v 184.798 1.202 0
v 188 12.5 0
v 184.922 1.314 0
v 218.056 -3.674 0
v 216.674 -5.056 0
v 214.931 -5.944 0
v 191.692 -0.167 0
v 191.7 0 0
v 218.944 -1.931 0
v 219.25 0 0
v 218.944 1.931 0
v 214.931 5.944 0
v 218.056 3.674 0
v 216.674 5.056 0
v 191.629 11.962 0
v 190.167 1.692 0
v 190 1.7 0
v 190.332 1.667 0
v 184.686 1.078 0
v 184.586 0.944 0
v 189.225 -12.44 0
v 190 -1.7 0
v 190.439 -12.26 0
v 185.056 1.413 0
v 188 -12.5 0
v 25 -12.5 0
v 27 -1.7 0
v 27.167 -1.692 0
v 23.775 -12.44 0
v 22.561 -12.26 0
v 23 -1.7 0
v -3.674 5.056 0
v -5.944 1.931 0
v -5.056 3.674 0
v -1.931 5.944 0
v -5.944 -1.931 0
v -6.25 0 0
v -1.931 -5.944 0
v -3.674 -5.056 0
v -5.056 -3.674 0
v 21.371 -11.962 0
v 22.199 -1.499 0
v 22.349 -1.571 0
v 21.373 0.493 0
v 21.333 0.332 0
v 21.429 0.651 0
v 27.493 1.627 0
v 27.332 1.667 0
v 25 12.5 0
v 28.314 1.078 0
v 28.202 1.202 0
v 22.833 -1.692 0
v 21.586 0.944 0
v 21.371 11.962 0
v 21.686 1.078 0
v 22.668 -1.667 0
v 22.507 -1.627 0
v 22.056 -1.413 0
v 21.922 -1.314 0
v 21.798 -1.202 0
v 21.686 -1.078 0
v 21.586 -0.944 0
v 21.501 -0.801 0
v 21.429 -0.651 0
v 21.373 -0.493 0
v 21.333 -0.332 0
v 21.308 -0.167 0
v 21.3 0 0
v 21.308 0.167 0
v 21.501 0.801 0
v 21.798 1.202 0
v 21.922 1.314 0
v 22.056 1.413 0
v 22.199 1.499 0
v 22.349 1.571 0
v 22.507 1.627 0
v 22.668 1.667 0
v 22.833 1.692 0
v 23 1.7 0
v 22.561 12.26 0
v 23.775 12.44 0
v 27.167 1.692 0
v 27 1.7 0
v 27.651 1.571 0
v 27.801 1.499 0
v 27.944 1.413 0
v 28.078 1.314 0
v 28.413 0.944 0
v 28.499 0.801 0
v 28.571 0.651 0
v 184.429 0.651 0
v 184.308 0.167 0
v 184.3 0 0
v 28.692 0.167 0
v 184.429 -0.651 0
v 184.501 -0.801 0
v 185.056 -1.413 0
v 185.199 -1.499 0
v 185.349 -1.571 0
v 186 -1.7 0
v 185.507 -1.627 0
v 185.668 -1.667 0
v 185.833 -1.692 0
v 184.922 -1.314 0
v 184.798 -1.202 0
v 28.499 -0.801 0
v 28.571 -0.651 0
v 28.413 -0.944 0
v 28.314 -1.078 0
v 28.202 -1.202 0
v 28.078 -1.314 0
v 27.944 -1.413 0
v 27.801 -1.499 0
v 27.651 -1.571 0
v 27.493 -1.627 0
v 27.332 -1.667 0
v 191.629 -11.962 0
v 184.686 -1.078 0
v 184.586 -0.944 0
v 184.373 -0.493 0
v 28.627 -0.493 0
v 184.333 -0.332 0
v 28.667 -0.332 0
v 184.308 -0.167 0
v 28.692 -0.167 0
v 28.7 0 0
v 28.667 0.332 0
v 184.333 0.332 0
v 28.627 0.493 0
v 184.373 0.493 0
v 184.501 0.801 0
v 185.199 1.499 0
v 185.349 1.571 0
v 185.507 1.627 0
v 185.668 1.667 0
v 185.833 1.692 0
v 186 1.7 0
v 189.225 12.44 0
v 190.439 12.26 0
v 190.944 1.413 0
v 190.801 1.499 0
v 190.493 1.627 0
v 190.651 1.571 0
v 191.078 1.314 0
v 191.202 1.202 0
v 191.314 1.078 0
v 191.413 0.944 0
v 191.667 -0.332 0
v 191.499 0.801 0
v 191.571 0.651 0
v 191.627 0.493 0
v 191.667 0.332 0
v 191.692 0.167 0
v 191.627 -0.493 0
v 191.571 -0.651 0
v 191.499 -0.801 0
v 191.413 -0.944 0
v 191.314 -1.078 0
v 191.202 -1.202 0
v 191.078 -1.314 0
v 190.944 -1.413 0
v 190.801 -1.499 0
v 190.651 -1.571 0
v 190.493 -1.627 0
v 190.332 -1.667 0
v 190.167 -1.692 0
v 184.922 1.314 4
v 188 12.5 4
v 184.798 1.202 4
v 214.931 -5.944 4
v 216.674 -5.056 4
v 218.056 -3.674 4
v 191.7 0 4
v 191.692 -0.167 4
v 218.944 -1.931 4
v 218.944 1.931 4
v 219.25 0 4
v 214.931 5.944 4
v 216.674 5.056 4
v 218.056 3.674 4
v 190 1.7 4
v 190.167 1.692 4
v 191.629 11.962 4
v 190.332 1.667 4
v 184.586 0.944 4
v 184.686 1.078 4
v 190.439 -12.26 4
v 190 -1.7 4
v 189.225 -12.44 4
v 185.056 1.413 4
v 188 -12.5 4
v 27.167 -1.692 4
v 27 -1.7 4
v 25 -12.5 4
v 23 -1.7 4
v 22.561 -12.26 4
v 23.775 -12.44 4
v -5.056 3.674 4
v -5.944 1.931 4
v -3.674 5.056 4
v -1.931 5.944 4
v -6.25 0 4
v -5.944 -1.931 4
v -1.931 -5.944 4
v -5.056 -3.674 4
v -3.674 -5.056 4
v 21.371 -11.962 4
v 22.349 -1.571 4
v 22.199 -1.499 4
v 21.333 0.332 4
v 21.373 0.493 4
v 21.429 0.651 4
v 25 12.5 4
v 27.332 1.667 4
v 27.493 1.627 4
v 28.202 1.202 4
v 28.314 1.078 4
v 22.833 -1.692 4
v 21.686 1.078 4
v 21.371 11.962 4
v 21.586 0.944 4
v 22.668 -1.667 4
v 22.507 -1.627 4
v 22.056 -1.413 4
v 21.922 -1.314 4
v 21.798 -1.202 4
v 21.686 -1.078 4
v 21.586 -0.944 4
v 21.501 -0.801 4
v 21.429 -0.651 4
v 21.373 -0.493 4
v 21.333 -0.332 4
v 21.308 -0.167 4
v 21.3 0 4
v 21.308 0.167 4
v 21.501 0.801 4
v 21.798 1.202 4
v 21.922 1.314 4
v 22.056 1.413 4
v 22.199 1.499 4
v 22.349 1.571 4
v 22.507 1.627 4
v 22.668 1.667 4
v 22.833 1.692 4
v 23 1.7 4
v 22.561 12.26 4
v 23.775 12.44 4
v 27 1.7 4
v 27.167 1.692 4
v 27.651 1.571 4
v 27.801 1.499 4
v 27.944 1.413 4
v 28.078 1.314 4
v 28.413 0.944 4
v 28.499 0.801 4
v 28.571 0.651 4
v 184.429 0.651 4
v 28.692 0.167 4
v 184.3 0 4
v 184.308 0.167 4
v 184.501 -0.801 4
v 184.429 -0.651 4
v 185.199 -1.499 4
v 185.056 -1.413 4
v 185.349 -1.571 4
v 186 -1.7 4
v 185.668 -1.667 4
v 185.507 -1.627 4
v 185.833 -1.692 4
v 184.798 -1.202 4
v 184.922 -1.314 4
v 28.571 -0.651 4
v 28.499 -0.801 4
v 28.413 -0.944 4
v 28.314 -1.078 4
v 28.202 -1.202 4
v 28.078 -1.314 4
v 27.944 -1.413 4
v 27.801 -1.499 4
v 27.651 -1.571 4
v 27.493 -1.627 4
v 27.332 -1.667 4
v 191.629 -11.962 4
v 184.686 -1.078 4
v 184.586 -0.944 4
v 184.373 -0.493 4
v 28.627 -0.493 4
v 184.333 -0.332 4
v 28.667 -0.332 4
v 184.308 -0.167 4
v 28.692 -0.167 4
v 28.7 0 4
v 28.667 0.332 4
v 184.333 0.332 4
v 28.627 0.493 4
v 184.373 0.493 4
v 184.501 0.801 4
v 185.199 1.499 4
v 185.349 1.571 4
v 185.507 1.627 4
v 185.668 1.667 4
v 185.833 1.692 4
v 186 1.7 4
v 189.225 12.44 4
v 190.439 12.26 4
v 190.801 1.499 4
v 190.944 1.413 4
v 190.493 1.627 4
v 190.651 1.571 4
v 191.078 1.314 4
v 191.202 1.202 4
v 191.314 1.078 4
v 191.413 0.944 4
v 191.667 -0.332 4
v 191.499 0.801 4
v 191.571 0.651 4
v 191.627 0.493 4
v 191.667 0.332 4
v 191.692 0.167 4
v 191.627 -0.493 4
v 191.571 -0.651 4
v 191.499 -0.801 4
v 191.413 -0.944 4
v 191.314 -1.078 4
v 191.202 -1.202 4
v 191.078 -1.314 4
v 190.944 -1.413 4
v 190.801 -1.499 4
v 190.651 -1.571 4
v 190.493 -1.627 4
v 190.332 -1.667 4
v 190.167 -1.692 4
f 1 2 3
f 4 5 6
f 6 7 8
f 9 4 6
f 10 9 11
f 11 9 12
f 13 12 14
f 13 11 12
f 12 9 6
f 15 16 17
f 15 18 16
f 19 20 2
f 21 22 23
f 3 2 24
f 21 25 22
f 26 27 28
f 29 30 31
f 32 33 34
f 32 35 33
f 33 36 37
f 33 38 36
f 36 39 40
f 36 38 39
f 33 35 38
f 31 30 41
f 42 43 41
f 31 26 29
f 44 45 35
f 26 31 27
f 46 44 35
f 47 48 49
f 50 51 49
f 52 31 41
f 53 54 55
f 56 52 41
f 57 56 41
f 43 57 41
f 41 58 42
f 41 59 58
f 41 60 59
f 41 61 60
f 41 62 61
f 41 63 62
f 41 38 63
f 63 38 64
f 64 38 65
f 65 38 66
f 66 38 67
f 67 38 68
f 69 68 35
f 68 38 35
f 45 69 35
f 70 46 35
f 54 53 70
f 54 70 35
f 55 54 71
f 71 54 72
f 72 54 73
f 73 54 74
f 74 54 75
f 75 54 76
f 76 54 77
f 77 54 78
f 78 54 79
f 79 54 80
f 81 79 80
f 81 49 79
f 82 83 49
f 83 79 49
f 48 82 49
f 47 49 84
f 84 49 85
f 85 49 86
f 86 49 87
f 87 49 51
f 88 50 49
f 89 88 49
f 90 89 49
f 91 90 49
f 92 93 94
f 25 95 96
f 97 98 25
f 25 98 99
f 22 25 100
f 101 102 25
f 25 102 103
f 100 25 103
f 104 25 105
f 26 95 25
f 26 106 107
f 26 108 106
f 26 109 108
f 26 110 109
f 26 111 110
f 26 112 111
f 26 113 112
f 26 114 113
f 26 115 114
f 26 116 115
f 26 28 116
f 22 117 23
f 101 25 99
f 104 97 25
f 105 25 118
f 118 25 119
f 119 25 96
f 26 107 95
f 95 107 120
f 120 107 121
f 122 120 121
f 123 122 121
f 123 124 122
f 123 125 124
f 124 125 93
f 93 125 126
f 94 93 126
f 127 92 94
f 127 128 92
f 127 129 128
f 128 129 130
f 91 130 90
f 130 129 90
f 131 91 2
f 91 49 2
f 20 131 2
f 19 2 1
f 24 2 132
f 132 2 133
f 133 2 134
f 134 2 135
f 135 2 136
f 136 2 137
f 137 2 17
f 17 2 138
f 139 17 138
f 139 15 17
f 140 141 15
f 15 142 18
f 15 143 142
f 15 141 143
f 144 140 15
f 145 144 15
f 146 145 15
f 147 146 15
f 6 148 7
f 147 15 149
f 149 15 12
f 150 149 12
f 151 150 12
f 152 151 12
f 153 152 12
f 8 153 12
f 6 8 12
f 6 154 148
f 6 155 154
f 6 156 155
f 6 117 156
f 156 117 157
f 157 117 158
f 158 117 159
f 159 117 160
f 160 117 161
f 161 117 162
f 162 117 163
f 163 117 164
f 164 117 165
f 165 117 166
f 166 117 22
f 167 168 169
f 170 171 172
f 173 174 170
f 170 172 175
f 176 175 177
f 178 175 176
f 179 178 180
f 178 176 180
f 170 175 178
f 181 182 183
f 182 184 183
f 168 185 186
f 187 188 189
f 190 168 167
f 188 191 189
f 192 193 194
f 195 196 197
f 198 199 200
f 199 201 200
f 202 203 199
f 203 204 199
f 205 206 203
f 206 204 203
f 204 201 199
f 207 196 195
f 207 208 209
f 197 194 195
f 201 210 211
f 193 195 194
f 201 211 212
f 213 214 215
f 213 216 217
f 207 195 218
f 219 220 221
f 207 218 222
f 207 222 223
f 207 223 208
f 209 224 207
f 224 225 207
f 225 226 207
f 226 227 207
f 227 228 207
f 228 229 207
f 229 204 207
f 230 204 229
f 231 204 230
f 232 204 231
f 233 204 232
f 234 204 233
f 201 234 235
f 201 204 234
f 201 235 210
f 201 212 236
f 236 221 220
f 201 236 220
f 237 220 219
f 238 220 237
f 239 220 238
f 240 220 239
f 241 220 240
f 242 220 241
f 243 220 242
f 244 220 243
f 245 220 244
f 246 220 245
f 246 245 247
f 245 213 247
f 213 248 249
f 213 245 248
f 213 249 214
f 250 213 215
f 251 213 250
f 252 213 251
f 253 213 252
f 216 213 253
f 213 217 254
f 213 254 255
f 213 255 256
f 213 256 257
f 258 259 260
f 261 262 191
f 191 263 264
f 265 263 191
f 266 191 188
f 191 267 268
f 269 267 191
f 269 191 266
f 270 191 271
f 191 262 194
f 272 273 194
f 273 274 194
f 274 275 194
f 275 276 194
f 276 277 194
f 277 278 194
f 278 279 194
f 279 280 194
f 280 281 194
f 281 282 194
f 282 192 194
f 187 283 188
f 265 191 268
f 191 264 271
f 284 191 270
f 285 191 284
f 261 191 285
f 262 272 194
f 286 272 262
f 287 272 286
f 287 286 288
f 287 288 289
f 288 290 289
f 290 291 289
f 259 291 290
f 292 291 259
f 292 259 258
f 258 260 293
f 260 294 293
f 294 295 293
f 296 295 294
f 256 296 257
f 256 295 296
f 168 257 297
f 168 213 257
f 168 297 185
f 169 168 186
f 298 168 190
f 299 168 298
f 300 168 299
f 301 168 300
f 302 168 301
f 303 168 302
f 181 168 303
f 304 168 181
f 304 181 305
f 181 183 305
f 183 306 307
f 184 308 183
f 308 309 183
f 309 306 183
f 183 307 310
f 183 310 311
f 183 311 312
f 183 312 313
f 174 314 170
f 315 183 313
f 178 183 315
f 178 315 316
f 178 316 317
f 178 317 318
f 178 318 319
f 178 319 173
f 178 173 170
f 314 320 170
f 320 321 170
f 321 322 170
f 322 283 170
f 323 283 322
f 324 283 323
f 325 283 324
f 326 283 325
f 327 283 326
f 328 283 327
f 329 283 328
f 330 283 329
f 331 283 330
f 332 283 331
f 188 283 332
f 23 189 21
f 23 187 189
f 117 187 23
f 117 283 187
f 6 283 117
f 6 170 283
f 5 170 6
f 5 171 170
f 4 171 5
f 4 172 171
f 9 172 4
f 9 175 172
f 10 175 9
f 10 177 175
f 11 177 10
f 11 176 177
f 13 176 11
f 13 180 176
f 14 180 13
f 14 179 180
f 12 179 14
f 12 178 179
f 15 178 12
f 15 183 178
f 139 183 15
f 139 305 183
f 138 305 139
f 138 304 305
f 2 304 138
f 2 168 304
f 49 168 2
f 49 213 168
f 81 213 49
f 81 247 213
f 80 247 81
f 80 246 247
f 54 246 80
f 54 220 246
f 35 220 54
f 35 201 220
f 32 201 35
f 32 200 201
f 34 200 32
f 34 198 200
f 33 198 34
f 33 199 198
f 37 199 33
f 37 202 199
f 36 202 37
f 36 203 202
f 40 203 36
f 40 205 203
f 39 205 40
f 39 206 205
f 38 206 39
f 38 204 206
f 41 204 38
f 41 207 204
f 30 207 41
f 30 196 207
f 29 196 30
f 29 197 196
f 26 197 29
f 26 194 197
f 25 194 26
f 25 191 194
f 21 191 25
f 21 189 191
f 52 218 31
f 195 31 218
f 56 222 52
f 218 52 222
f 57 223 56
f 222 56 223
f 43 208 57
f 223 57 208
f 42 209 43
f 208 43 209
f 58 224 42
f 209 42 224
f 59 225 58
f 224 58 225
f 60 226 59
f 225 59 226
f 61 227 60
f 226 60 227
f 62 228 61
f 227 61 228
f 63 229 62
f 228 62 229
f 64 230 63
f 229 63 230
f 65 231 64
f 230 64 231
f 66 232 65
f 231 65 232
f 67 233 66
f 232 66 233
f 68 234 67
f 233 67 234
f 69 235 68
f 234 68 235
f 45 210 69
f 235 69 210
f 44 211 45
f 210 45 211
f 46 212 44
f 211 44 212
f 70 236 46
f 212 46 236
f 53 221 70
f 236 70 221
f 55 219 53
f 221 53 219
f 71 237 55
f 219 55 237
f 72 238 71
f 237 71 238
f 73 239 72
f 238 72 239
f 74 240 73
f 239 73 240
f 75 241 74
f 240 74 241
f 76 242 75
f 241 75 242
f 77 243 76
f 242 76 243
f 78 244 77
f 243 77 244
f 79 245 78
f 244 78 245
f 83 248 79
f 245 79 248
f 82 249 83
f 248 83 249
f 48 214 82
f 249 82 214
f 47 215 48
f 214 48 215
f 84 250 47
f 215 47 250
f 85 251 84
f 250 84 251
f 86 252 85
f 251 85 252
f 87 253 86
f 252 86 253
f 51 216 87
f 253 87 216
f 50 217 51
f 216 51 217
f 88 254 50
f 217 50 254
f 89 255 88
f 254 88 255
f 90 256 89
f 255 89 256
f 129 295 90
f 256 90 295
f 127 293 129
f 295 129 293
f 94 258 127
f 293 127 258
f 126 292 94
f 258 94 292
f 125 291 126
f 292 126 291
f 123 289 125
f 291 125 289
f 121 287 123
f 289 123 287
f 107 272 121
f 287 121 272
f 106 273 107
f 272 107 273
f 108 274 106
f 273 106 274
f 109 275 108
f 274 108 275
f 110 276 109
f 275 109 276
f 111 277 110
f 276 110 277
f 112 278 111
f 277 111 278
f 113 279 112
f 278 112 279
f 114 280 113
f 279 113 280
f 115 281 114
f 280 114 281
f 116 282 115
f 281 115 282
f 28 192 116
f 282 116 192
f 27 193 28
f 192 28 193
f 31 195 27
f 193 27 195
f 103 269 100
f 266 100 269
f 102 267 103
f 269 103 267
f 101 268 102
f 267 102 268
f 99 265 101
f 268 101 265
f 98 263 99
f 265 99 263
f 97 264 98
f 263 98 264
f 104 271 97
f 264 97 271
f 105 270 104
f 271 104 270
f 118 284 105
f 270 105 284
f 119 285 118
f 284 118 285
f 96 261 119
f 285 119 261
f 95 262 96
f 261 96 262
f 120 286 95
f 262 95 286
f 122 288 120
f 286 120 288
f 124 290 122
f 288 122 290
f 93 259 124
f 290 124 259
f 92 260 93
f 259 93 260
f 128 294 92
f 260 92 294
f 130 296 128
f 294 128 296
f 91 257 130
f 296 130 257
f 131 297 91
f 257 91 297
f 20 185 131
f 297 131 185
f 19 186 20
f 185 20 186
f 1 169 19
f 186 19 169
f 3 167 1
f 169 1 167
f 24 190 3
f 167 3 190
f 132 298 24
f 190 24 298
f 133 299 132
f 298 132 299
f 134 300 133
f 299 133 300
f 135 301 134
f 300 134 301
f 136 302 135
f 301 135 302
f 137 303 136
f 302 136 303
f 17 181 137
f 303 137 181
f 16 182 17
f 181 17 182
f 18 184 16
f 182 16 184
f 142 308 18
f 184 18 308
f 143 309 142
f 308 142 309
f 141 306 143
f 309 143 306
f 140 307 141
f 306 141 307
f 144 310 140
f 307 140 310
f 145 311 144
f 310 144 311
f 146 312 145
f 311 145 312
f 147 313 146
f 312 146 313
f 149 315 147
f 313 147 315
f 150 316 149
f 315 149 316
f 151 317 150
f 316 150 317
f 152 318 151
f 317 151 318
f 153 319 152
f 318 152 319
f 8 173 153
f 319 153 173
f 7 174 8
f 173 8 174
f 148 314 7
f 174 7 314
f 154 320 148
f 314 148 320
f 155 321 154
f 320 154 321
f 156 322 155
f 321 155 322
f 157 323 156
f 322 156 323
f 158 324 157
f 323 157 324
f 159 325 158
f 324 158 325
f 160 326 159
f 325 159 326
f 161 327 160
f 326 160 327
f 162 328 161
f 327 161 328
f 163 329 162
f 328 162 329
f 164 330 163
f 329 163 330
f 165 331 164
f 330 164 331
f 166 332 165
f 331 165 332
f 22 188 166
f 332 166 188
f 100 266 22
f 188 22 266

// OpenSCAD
l_tot=225;
l_holes=163;
w=25;
hol=3.4;
tupp=12.5;

module tupp() {
    circle(d=tupp);
}

module stor(d=w, hol=hol) {
    difference() {
        circle(d=w, $fn=64);
    }
}

linear_extrude(height=4) {
    difference() {
        hull() {
            tupp();
            translate([w,0,0]) {
                stor();
                translate([l_holes,0]) {
                    stor();
                    translate([w,0,0]) {
                        tupp();
                    }
                }
            }
        }
        hull() {
            translate([w-2,0,0]) circle(d=hol, $fn=64);
            translate([w+2,0,0]) circle(d=hol, $fn=64);
        }
        hull() {
            translate([l_holes+w-2,0]) circle(d=hol, $fn=64);
            translate([l_holes+w+2,0]) circle(d=hol, $fn=64);
        }
    }
}
